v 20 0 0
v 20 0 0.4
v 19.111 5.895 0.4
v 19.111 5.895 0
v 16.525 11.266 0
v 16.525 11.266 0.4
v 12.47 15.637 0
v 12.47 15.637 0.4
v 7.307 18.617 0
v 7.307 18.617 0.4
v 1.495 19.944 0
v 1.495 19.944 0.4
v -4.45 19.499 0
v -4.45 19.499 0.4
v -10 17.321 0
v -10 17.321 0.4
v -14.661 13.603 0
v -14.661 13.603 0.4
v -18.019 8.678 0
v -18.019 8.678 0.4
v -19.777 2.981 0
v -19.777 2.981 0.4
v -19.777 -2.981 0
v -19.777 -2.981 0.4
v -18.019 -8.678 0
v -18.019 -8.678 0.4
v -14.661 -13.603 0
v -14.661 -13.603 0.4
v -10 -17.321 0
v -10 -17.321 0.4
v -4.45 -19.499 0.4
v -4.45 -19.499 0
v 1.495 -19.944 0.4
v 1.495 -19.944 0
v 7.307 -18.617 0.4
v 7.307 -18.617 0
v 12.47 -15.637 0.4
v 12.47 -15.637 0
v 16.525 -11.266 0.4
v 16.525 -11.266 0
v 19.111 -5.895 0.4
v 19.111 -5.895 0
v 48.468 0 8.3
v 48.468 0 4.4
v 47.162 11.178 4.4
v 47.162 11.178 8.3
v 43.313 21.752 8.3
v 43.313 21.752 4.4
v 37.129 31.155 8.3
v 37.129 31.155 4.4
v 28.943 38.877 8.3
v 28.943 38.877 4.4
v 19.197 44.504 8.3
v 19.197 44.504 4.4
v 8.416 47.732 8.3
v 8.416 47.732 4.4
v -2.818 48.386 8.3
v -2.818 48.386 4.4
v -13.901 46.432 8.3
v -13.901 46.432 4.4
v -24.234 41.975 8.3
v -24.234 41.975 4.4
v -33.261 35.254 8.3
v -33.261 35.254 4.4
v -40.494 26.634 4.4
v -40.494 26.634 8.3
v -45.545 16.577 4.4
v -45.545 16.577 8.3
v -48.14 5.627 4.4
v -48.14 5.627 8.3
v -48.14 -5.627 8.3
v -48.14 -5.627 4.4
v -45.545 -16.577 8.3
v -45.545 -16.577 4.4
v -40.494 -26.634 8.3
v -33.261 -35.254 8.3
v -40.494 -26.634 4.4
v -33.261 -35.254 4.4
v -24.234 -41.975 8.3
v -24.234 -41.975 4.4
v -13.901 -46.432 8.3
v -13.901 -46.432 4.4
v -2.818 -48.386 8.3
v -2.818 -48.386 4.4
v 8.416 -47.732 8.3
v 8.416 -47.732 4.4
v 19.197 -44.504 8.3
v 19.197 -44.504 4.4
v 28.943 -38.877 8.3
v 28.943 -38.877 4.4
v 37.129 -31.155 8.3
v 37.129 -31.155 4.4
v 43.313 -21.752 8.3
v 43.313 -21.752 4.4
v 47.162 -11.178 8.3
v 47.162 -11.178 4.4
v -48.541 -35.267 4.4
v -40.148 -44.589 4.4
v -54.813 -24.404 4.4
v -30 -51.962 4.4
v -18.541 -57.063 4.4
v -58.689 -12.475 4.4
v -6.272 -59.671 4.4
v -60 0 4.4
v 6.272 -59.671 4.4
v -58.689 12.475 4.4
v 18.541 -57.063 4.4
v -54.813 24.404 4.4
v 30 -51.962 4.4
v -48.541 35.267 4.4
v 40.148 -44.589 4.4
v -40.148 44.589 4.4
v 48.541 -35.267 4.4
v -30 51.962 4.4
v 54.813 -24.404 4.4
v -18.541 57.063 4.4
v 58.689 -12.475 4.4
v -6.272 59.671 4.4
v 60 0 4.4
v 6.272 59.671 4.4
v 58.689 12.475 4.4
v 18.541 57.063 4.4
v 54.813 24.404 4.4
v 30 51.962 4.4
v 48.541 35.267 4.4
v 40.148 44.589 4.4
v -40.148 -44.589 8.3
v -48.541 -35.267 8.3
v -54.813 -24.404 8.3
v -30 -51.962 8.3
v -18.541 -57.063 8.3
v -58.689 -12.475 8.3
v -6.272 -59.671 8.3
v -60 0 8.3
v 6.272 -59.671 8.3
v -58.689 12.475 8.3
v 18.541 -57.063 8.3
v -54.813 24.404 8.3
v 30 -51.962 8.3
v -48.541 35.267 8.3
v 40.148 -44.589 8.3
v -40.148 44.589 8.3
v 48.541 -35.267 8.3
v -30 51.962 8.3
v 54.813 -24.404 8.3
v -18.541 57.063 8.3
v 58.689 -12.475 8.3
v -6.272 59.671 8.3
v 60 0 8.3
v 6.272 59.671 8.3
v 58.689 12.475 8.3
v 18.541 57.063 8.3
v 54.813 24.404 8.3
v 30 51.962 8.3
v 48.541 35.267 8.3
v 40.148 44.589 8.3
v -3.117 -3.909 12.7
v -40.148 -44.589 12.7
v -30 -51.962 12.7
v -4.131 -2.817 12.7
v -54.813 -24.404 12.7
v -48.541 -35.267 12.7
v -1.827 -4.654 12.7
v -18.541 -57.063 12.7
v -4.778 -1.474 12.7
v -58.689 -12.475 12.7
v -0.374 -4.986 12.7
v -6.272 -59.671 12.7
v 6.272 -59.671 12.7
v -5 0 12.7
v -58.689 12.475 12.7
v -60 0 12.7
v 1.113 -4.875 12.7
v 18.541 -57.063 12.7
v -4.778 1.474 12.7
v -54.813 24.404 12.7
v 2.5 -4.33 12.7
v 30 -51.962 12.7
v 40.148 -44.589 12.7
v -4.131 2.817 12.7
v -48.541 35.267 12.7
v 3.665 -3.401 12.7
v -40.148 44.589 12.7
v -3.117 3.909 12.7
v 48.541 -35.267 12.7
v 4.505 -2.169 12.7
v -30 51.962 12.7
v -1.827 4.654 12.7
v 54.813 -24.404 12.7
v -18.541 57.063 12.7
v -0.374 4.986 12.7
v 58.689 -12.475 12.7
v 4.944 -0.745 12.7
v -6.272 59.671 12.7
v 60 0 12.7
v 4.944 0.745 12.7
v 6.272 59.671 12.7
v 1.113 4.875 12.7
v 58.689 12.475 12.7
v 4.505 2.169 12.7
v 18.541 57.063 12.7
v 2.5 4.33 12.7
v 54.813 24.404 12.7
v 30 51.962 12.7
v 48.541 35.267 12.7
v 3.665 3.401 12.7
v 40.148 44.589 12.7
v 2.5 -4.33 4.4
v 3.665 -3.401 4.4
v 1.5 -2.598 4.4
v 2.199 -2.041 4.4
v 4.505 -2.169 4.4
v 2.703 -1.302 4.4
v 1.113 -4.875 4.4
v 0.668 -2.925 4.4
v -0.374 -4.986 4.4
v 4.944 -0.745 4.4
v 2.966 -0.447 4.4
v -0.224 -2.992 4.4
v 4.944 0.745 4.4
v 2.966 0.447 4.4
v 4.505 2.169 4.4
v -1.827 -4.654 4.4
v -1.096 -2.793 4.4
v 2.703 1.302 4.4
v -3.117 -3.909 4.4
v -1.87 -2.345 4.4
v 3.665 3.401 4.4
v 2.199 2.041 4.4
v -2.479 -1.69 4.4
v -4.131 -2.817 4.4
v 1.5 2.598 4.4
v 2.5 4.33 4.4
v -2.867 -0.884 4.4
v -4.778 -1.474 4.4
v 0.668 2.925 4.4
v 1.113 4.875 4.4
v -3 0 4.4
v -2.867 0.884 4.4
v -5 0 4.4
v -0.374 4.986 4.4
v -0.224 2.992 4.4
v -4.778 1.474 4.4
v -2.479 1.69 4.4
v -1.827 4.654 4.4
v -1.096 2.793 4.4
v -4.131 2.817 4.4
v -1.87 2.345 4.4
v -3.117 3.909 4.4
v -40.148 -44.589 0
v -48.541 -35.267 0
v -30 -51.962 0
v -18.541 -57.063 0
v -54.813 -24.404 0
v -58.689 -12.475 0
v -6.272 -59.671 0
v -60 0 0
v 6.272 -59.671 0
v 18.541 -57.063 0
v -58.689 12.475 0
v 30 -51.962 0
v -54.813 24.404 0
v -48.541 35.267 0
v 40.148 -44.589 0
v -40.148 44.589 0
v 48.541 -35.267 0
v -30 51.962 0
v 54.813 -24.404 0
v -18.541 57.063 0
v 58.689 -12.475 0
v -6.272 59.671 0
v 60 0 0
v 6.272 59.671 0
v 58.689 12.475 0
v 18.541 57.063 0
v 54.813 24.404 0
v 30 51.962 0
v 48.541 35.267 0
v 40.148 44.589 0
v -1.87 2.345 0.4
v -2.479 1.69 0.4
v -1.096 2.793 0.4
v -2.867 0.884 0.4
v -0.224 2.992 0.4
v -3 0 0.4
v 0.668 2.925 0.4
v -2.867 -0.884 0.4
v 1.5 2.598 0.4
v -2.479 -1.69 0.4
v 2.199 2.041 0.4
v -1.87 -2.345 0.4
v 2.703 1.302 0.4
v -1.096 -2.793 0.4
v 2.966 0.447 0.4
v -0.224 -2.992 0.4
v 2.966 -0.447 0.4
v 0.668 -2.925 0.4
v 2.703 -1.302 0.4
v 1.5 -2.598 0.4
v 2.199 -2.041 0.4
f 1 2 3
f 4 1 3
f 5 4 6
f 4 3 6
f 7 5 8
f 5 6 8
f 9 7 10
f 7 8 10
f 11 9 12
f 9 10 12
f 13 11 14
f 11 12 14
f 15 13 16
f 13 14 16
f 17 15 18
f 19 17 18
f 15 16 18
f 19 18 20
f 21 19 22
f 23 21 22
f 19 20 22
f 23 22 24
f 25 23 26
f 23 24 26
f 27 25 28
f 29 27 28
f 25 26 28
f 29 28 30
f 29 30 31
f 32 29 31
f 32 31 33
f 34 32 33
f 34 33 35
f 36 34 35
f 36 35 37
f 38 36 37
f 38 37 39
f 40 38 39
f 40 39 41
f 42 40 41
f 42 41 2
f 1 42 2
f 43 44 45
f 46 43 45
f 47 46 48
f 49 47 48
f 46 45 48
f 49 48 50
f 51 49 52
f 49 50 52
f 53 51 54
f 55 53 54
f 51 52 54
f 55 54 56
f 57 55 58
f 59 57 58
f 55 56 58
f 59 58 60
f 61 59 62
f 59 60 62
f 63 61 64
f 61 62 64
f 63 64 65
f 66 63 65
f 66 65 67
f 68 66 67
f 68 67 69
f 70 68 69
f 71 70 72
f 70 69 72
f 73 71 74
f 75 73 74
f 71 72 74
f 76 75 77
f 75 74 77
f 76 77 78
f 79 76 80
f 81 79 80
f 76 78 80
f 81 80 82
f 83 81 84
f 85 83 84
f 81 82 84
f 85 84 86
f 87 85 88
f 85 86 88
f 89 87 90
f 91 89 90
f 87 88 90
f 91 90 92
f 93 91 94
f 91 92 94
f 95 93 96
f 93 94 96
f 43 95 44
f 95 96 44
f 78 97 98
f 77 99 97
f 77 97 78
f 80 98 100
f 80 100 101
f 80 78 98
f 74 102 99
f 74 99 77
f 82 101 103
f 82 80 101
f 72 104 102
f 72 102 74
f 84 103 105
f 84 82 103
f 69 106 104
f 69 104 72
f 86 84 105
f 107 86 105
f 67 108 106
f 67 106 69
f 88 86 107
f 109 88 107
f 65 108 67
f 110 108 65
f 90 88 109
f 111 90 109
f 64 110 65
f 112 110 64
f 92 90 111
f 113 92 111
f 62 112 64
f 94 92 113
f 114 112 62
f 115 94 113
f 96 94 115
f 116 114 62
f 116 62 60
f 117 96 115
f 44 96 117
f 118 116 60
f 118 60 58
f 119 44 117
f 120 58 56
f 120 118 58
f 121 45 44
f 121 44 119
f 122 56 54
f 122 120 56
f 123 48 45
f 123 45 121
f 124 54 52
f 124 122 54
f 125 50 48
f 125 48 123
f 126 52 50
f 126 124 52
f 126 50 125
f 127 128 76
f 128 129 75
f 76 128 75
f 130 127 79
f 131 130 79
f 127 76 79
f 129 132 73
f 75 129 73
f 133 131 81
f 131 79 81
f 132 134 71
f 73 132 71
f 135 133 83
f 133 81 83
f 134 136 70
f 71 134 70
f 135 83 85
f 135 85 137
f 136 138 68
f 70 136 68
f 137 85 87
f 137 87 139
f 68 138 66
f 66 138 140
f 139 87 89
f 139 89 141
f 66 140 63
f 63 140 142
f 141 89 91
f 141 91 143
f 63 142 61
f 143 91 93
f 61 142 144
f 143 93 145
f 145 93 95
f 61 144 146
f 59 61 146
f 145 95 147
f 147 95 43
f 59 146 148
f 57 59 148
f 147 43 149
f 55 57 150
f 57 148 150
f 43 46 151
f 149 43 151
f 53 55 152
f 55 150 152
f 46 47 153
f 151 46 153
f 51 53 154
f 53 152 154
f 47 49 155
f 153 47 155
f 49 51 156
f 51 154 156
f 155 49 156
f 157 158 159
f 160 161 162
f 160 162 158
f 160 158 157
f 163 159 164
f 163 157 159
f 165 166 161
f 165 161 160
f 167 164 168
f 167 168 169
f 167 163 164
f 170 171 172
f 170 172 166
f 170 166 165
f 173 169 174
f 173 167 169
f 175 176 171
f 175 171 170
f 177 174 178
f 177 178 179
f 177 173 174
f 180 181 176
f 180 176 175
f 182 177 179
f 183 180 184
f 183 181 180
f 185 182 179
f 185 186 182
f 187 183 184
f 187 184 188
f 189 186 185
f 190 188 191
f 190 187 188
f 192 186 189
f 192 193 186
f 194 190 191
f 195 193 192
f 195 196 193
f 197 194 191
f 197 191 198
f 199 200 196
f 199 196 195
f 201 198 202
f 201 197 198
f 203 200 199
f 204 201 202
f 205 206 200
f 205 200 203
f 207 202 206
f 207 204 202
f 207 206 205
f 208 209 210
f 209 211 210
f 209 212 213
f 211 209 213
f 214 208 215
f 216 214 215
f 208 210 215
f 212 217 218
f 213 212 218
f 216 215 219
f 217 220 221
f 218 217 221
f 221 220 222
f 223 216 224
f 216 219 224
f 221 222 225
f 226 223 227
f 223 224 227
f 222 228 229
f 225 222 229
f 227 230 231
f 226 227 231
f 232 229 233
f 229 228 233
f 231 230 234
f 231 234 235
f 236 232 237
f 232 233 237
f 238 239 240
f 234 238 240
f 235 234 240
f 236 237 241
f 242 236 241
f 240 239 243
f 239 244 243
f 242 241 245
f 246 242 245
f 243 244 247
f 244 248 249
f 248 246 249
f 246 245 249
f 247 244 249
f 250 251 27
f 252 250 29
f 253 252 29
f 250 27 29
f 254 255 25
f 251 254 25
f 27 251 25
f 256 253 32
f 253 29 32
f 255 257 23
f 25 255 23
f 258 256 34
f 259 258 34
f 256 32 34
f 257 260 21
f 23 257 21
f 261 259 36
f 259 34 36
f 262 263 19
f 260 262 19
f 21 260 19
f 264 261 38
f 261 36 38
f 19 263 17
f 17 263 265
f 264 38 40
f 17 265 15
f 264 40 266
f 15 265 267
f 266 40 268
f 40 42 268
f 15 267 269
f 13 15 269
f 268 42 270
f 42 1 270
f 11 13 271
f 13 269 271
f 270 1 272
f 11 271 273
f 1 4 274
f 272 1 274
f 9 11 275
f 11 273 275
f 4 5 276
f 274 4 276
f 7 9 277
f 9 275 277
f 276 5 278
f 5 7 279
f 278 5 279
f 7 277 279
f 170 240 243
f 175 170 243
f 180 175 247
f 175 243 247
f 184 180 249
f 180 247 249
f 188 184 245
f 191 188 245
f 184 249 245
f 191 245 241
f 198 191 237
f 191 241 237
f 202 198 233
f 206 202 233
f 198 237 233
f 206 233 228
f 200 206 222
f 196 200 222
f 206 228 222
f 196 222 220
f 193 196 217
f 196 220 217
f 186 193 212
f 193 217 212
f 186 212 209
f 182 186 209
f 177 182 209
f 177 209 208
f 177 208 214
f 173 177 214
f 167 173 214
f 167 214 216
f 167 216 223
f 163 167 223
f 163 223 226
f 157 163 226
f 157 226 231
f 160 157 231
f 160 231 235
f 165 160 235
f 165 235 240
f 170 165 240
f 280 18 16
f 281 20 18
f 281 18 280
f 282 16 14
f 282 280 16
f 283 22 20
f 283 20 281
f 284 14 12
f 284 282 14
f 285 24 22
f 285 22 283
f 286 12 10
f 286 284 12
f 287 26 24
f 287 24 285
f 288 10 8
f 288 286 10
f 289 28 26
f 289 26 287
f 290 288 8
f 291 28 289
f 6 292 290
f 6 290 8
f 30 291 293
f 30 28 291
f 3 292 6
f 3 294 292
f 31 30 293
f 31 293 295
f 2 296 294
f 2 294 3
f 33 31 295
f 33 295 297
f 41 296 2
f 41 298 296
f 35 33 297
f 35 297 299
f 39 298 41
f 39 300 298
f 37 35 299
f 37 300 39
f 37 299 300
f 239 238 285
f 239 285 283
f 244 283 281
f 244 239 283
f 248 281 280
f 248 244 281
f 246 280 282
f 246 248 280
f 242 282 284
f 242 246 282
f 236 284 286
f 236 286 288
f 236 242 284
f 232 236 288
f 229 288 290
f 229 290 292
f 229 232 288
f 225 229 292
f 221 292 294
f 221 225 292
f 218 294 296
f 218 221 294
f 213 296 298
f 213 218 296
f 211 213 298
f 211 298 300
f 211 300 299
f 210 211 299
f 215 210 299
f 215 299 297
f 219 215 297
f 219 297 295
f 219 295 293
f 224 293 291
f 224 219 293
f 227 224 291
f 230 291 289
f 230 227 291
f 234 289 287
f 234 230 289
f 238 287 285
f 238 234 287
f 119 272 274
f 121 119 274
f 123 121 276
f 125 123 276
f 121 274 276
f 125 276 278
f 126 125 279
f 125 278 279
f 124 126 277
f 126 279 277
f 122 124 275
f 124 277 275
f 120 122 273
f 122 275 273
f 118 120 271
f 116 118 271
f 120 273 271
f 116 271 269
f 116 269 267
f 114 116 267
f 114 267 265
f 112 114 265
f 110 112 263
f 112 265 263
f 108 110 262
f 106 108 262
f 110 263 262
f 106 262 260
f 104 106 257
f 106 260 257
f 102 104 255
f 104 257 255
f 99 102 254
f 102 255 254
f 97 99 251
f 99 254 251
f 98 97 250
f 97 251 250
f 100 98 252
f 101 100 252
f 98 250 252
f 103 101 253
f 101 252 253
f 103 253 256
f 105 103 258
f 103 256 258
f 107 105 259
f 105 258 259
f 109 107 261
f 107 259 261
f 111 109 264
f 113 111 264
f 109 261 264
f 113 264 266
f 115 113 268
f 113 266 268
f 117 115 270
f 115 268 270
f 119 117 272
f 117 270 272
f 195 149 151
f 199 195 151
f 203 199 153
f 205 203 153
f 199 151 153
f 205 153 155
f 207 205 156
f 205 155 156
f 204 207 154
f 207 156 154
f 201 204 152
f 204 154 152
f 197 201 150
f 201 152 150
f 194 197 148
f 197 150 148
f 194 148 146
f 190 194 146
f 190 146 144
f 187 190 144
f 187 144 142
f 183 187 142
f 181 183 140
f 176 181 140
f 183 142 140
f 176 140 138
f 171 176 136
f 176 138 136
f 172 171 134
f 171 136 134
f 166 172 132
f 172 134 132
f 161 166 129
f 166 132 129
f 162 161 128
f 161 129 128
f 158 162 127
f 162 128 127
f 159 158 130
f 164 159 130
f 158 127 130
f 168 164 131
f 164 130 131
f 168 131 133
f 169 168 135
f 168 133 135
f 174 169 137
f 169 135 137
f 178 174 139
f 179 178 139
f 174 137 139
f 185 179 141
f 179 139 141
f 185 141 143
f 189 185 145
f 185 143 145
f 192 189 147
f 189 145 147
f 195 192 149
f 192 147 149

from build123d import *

# Parameters (mm, degrees)
SKETCH1_R           = 60
BOSS_EXTRUDE2_DEPTH = 4.4
SKETCH2_R           = 20
CUT_EXTRUDE1_DEPTH  = 20.9
SKETCH3_R           = 48.468089367
BOSS_EXTRUDE3_DEPTH = 3.9
SKETCH4_R           = 60
BOSS_EXTRUDE4_DEPTH = 4.4
SKETCH5_R           = 20
SKETCH5_R_2         = 3
BOSS_EXTRUDE5_DEPTH = 4
SKETCH7_R           = 5
CUT_EXTRUDE4_DEPTH  = 16


with BuildPart() as part:
    # Sketch1 → Boss-Extrude2 (new body)
    with BuildSketch(Plane.XY):
        Circle(SKETCH1_R)
    extrude(amount=BOSS_EXTRUDE2_DEPTH)

    # Sketch2 → Cut-Extrude1 (cut)
    with BuildSketch(Plane.XY.offset(4.4)):
        Circle(SKETCH2_R)
    extrude(amount=-CUT_EXTRUDE1_DEPTH, mode=Mode.SUBTRACT)

    # Sketch3 → Boss-Extrude3 (add)
    with BuildSketch(Plane.XY.offset(4.4)):
        Circle(SKETCH3_R)
    extrude(amount=BOSS_EXTRUDE3_DEPTH)

    # Sketch4 → Boss-Extrude4 (add)
    with BuildSketch(Plane.XY.offset(8.3)):
        Circle(SKETCH4_R)
    extrude(amount=BOSS_EXTRUDE4_DEPTH)

    # Sketch5 → Boss-Extrude5 (add)
    with BuildSketch(Plane(origin=(0, 0, 4.4), x_dir=(-1, 0, 0), z_dir=(0, 0, -1))):
        with Locations(Location((0, 0, 0), (0, 0, 180))):
            Circle(SKETCH5_R)
        Circle(SKETCH5_R_2, mode=Mode.SUBTRACT)
    extrude(amount=BOSS_EXTRUDE5_DEPTH)

    # Sketch7 → Cut-Extrude4 (cut)
    with BuildSketch(Plane(origin=(0, 0, 4.4), x_dir=(-1, 0, 0), z_dir=(0, 0, -1))):
        Circle(SKETCH7_R)
    extrude(amount=-CUT_EXTRUDE4_DEPTH, mode=Mode.SUBTRACT)


solid = part.part
